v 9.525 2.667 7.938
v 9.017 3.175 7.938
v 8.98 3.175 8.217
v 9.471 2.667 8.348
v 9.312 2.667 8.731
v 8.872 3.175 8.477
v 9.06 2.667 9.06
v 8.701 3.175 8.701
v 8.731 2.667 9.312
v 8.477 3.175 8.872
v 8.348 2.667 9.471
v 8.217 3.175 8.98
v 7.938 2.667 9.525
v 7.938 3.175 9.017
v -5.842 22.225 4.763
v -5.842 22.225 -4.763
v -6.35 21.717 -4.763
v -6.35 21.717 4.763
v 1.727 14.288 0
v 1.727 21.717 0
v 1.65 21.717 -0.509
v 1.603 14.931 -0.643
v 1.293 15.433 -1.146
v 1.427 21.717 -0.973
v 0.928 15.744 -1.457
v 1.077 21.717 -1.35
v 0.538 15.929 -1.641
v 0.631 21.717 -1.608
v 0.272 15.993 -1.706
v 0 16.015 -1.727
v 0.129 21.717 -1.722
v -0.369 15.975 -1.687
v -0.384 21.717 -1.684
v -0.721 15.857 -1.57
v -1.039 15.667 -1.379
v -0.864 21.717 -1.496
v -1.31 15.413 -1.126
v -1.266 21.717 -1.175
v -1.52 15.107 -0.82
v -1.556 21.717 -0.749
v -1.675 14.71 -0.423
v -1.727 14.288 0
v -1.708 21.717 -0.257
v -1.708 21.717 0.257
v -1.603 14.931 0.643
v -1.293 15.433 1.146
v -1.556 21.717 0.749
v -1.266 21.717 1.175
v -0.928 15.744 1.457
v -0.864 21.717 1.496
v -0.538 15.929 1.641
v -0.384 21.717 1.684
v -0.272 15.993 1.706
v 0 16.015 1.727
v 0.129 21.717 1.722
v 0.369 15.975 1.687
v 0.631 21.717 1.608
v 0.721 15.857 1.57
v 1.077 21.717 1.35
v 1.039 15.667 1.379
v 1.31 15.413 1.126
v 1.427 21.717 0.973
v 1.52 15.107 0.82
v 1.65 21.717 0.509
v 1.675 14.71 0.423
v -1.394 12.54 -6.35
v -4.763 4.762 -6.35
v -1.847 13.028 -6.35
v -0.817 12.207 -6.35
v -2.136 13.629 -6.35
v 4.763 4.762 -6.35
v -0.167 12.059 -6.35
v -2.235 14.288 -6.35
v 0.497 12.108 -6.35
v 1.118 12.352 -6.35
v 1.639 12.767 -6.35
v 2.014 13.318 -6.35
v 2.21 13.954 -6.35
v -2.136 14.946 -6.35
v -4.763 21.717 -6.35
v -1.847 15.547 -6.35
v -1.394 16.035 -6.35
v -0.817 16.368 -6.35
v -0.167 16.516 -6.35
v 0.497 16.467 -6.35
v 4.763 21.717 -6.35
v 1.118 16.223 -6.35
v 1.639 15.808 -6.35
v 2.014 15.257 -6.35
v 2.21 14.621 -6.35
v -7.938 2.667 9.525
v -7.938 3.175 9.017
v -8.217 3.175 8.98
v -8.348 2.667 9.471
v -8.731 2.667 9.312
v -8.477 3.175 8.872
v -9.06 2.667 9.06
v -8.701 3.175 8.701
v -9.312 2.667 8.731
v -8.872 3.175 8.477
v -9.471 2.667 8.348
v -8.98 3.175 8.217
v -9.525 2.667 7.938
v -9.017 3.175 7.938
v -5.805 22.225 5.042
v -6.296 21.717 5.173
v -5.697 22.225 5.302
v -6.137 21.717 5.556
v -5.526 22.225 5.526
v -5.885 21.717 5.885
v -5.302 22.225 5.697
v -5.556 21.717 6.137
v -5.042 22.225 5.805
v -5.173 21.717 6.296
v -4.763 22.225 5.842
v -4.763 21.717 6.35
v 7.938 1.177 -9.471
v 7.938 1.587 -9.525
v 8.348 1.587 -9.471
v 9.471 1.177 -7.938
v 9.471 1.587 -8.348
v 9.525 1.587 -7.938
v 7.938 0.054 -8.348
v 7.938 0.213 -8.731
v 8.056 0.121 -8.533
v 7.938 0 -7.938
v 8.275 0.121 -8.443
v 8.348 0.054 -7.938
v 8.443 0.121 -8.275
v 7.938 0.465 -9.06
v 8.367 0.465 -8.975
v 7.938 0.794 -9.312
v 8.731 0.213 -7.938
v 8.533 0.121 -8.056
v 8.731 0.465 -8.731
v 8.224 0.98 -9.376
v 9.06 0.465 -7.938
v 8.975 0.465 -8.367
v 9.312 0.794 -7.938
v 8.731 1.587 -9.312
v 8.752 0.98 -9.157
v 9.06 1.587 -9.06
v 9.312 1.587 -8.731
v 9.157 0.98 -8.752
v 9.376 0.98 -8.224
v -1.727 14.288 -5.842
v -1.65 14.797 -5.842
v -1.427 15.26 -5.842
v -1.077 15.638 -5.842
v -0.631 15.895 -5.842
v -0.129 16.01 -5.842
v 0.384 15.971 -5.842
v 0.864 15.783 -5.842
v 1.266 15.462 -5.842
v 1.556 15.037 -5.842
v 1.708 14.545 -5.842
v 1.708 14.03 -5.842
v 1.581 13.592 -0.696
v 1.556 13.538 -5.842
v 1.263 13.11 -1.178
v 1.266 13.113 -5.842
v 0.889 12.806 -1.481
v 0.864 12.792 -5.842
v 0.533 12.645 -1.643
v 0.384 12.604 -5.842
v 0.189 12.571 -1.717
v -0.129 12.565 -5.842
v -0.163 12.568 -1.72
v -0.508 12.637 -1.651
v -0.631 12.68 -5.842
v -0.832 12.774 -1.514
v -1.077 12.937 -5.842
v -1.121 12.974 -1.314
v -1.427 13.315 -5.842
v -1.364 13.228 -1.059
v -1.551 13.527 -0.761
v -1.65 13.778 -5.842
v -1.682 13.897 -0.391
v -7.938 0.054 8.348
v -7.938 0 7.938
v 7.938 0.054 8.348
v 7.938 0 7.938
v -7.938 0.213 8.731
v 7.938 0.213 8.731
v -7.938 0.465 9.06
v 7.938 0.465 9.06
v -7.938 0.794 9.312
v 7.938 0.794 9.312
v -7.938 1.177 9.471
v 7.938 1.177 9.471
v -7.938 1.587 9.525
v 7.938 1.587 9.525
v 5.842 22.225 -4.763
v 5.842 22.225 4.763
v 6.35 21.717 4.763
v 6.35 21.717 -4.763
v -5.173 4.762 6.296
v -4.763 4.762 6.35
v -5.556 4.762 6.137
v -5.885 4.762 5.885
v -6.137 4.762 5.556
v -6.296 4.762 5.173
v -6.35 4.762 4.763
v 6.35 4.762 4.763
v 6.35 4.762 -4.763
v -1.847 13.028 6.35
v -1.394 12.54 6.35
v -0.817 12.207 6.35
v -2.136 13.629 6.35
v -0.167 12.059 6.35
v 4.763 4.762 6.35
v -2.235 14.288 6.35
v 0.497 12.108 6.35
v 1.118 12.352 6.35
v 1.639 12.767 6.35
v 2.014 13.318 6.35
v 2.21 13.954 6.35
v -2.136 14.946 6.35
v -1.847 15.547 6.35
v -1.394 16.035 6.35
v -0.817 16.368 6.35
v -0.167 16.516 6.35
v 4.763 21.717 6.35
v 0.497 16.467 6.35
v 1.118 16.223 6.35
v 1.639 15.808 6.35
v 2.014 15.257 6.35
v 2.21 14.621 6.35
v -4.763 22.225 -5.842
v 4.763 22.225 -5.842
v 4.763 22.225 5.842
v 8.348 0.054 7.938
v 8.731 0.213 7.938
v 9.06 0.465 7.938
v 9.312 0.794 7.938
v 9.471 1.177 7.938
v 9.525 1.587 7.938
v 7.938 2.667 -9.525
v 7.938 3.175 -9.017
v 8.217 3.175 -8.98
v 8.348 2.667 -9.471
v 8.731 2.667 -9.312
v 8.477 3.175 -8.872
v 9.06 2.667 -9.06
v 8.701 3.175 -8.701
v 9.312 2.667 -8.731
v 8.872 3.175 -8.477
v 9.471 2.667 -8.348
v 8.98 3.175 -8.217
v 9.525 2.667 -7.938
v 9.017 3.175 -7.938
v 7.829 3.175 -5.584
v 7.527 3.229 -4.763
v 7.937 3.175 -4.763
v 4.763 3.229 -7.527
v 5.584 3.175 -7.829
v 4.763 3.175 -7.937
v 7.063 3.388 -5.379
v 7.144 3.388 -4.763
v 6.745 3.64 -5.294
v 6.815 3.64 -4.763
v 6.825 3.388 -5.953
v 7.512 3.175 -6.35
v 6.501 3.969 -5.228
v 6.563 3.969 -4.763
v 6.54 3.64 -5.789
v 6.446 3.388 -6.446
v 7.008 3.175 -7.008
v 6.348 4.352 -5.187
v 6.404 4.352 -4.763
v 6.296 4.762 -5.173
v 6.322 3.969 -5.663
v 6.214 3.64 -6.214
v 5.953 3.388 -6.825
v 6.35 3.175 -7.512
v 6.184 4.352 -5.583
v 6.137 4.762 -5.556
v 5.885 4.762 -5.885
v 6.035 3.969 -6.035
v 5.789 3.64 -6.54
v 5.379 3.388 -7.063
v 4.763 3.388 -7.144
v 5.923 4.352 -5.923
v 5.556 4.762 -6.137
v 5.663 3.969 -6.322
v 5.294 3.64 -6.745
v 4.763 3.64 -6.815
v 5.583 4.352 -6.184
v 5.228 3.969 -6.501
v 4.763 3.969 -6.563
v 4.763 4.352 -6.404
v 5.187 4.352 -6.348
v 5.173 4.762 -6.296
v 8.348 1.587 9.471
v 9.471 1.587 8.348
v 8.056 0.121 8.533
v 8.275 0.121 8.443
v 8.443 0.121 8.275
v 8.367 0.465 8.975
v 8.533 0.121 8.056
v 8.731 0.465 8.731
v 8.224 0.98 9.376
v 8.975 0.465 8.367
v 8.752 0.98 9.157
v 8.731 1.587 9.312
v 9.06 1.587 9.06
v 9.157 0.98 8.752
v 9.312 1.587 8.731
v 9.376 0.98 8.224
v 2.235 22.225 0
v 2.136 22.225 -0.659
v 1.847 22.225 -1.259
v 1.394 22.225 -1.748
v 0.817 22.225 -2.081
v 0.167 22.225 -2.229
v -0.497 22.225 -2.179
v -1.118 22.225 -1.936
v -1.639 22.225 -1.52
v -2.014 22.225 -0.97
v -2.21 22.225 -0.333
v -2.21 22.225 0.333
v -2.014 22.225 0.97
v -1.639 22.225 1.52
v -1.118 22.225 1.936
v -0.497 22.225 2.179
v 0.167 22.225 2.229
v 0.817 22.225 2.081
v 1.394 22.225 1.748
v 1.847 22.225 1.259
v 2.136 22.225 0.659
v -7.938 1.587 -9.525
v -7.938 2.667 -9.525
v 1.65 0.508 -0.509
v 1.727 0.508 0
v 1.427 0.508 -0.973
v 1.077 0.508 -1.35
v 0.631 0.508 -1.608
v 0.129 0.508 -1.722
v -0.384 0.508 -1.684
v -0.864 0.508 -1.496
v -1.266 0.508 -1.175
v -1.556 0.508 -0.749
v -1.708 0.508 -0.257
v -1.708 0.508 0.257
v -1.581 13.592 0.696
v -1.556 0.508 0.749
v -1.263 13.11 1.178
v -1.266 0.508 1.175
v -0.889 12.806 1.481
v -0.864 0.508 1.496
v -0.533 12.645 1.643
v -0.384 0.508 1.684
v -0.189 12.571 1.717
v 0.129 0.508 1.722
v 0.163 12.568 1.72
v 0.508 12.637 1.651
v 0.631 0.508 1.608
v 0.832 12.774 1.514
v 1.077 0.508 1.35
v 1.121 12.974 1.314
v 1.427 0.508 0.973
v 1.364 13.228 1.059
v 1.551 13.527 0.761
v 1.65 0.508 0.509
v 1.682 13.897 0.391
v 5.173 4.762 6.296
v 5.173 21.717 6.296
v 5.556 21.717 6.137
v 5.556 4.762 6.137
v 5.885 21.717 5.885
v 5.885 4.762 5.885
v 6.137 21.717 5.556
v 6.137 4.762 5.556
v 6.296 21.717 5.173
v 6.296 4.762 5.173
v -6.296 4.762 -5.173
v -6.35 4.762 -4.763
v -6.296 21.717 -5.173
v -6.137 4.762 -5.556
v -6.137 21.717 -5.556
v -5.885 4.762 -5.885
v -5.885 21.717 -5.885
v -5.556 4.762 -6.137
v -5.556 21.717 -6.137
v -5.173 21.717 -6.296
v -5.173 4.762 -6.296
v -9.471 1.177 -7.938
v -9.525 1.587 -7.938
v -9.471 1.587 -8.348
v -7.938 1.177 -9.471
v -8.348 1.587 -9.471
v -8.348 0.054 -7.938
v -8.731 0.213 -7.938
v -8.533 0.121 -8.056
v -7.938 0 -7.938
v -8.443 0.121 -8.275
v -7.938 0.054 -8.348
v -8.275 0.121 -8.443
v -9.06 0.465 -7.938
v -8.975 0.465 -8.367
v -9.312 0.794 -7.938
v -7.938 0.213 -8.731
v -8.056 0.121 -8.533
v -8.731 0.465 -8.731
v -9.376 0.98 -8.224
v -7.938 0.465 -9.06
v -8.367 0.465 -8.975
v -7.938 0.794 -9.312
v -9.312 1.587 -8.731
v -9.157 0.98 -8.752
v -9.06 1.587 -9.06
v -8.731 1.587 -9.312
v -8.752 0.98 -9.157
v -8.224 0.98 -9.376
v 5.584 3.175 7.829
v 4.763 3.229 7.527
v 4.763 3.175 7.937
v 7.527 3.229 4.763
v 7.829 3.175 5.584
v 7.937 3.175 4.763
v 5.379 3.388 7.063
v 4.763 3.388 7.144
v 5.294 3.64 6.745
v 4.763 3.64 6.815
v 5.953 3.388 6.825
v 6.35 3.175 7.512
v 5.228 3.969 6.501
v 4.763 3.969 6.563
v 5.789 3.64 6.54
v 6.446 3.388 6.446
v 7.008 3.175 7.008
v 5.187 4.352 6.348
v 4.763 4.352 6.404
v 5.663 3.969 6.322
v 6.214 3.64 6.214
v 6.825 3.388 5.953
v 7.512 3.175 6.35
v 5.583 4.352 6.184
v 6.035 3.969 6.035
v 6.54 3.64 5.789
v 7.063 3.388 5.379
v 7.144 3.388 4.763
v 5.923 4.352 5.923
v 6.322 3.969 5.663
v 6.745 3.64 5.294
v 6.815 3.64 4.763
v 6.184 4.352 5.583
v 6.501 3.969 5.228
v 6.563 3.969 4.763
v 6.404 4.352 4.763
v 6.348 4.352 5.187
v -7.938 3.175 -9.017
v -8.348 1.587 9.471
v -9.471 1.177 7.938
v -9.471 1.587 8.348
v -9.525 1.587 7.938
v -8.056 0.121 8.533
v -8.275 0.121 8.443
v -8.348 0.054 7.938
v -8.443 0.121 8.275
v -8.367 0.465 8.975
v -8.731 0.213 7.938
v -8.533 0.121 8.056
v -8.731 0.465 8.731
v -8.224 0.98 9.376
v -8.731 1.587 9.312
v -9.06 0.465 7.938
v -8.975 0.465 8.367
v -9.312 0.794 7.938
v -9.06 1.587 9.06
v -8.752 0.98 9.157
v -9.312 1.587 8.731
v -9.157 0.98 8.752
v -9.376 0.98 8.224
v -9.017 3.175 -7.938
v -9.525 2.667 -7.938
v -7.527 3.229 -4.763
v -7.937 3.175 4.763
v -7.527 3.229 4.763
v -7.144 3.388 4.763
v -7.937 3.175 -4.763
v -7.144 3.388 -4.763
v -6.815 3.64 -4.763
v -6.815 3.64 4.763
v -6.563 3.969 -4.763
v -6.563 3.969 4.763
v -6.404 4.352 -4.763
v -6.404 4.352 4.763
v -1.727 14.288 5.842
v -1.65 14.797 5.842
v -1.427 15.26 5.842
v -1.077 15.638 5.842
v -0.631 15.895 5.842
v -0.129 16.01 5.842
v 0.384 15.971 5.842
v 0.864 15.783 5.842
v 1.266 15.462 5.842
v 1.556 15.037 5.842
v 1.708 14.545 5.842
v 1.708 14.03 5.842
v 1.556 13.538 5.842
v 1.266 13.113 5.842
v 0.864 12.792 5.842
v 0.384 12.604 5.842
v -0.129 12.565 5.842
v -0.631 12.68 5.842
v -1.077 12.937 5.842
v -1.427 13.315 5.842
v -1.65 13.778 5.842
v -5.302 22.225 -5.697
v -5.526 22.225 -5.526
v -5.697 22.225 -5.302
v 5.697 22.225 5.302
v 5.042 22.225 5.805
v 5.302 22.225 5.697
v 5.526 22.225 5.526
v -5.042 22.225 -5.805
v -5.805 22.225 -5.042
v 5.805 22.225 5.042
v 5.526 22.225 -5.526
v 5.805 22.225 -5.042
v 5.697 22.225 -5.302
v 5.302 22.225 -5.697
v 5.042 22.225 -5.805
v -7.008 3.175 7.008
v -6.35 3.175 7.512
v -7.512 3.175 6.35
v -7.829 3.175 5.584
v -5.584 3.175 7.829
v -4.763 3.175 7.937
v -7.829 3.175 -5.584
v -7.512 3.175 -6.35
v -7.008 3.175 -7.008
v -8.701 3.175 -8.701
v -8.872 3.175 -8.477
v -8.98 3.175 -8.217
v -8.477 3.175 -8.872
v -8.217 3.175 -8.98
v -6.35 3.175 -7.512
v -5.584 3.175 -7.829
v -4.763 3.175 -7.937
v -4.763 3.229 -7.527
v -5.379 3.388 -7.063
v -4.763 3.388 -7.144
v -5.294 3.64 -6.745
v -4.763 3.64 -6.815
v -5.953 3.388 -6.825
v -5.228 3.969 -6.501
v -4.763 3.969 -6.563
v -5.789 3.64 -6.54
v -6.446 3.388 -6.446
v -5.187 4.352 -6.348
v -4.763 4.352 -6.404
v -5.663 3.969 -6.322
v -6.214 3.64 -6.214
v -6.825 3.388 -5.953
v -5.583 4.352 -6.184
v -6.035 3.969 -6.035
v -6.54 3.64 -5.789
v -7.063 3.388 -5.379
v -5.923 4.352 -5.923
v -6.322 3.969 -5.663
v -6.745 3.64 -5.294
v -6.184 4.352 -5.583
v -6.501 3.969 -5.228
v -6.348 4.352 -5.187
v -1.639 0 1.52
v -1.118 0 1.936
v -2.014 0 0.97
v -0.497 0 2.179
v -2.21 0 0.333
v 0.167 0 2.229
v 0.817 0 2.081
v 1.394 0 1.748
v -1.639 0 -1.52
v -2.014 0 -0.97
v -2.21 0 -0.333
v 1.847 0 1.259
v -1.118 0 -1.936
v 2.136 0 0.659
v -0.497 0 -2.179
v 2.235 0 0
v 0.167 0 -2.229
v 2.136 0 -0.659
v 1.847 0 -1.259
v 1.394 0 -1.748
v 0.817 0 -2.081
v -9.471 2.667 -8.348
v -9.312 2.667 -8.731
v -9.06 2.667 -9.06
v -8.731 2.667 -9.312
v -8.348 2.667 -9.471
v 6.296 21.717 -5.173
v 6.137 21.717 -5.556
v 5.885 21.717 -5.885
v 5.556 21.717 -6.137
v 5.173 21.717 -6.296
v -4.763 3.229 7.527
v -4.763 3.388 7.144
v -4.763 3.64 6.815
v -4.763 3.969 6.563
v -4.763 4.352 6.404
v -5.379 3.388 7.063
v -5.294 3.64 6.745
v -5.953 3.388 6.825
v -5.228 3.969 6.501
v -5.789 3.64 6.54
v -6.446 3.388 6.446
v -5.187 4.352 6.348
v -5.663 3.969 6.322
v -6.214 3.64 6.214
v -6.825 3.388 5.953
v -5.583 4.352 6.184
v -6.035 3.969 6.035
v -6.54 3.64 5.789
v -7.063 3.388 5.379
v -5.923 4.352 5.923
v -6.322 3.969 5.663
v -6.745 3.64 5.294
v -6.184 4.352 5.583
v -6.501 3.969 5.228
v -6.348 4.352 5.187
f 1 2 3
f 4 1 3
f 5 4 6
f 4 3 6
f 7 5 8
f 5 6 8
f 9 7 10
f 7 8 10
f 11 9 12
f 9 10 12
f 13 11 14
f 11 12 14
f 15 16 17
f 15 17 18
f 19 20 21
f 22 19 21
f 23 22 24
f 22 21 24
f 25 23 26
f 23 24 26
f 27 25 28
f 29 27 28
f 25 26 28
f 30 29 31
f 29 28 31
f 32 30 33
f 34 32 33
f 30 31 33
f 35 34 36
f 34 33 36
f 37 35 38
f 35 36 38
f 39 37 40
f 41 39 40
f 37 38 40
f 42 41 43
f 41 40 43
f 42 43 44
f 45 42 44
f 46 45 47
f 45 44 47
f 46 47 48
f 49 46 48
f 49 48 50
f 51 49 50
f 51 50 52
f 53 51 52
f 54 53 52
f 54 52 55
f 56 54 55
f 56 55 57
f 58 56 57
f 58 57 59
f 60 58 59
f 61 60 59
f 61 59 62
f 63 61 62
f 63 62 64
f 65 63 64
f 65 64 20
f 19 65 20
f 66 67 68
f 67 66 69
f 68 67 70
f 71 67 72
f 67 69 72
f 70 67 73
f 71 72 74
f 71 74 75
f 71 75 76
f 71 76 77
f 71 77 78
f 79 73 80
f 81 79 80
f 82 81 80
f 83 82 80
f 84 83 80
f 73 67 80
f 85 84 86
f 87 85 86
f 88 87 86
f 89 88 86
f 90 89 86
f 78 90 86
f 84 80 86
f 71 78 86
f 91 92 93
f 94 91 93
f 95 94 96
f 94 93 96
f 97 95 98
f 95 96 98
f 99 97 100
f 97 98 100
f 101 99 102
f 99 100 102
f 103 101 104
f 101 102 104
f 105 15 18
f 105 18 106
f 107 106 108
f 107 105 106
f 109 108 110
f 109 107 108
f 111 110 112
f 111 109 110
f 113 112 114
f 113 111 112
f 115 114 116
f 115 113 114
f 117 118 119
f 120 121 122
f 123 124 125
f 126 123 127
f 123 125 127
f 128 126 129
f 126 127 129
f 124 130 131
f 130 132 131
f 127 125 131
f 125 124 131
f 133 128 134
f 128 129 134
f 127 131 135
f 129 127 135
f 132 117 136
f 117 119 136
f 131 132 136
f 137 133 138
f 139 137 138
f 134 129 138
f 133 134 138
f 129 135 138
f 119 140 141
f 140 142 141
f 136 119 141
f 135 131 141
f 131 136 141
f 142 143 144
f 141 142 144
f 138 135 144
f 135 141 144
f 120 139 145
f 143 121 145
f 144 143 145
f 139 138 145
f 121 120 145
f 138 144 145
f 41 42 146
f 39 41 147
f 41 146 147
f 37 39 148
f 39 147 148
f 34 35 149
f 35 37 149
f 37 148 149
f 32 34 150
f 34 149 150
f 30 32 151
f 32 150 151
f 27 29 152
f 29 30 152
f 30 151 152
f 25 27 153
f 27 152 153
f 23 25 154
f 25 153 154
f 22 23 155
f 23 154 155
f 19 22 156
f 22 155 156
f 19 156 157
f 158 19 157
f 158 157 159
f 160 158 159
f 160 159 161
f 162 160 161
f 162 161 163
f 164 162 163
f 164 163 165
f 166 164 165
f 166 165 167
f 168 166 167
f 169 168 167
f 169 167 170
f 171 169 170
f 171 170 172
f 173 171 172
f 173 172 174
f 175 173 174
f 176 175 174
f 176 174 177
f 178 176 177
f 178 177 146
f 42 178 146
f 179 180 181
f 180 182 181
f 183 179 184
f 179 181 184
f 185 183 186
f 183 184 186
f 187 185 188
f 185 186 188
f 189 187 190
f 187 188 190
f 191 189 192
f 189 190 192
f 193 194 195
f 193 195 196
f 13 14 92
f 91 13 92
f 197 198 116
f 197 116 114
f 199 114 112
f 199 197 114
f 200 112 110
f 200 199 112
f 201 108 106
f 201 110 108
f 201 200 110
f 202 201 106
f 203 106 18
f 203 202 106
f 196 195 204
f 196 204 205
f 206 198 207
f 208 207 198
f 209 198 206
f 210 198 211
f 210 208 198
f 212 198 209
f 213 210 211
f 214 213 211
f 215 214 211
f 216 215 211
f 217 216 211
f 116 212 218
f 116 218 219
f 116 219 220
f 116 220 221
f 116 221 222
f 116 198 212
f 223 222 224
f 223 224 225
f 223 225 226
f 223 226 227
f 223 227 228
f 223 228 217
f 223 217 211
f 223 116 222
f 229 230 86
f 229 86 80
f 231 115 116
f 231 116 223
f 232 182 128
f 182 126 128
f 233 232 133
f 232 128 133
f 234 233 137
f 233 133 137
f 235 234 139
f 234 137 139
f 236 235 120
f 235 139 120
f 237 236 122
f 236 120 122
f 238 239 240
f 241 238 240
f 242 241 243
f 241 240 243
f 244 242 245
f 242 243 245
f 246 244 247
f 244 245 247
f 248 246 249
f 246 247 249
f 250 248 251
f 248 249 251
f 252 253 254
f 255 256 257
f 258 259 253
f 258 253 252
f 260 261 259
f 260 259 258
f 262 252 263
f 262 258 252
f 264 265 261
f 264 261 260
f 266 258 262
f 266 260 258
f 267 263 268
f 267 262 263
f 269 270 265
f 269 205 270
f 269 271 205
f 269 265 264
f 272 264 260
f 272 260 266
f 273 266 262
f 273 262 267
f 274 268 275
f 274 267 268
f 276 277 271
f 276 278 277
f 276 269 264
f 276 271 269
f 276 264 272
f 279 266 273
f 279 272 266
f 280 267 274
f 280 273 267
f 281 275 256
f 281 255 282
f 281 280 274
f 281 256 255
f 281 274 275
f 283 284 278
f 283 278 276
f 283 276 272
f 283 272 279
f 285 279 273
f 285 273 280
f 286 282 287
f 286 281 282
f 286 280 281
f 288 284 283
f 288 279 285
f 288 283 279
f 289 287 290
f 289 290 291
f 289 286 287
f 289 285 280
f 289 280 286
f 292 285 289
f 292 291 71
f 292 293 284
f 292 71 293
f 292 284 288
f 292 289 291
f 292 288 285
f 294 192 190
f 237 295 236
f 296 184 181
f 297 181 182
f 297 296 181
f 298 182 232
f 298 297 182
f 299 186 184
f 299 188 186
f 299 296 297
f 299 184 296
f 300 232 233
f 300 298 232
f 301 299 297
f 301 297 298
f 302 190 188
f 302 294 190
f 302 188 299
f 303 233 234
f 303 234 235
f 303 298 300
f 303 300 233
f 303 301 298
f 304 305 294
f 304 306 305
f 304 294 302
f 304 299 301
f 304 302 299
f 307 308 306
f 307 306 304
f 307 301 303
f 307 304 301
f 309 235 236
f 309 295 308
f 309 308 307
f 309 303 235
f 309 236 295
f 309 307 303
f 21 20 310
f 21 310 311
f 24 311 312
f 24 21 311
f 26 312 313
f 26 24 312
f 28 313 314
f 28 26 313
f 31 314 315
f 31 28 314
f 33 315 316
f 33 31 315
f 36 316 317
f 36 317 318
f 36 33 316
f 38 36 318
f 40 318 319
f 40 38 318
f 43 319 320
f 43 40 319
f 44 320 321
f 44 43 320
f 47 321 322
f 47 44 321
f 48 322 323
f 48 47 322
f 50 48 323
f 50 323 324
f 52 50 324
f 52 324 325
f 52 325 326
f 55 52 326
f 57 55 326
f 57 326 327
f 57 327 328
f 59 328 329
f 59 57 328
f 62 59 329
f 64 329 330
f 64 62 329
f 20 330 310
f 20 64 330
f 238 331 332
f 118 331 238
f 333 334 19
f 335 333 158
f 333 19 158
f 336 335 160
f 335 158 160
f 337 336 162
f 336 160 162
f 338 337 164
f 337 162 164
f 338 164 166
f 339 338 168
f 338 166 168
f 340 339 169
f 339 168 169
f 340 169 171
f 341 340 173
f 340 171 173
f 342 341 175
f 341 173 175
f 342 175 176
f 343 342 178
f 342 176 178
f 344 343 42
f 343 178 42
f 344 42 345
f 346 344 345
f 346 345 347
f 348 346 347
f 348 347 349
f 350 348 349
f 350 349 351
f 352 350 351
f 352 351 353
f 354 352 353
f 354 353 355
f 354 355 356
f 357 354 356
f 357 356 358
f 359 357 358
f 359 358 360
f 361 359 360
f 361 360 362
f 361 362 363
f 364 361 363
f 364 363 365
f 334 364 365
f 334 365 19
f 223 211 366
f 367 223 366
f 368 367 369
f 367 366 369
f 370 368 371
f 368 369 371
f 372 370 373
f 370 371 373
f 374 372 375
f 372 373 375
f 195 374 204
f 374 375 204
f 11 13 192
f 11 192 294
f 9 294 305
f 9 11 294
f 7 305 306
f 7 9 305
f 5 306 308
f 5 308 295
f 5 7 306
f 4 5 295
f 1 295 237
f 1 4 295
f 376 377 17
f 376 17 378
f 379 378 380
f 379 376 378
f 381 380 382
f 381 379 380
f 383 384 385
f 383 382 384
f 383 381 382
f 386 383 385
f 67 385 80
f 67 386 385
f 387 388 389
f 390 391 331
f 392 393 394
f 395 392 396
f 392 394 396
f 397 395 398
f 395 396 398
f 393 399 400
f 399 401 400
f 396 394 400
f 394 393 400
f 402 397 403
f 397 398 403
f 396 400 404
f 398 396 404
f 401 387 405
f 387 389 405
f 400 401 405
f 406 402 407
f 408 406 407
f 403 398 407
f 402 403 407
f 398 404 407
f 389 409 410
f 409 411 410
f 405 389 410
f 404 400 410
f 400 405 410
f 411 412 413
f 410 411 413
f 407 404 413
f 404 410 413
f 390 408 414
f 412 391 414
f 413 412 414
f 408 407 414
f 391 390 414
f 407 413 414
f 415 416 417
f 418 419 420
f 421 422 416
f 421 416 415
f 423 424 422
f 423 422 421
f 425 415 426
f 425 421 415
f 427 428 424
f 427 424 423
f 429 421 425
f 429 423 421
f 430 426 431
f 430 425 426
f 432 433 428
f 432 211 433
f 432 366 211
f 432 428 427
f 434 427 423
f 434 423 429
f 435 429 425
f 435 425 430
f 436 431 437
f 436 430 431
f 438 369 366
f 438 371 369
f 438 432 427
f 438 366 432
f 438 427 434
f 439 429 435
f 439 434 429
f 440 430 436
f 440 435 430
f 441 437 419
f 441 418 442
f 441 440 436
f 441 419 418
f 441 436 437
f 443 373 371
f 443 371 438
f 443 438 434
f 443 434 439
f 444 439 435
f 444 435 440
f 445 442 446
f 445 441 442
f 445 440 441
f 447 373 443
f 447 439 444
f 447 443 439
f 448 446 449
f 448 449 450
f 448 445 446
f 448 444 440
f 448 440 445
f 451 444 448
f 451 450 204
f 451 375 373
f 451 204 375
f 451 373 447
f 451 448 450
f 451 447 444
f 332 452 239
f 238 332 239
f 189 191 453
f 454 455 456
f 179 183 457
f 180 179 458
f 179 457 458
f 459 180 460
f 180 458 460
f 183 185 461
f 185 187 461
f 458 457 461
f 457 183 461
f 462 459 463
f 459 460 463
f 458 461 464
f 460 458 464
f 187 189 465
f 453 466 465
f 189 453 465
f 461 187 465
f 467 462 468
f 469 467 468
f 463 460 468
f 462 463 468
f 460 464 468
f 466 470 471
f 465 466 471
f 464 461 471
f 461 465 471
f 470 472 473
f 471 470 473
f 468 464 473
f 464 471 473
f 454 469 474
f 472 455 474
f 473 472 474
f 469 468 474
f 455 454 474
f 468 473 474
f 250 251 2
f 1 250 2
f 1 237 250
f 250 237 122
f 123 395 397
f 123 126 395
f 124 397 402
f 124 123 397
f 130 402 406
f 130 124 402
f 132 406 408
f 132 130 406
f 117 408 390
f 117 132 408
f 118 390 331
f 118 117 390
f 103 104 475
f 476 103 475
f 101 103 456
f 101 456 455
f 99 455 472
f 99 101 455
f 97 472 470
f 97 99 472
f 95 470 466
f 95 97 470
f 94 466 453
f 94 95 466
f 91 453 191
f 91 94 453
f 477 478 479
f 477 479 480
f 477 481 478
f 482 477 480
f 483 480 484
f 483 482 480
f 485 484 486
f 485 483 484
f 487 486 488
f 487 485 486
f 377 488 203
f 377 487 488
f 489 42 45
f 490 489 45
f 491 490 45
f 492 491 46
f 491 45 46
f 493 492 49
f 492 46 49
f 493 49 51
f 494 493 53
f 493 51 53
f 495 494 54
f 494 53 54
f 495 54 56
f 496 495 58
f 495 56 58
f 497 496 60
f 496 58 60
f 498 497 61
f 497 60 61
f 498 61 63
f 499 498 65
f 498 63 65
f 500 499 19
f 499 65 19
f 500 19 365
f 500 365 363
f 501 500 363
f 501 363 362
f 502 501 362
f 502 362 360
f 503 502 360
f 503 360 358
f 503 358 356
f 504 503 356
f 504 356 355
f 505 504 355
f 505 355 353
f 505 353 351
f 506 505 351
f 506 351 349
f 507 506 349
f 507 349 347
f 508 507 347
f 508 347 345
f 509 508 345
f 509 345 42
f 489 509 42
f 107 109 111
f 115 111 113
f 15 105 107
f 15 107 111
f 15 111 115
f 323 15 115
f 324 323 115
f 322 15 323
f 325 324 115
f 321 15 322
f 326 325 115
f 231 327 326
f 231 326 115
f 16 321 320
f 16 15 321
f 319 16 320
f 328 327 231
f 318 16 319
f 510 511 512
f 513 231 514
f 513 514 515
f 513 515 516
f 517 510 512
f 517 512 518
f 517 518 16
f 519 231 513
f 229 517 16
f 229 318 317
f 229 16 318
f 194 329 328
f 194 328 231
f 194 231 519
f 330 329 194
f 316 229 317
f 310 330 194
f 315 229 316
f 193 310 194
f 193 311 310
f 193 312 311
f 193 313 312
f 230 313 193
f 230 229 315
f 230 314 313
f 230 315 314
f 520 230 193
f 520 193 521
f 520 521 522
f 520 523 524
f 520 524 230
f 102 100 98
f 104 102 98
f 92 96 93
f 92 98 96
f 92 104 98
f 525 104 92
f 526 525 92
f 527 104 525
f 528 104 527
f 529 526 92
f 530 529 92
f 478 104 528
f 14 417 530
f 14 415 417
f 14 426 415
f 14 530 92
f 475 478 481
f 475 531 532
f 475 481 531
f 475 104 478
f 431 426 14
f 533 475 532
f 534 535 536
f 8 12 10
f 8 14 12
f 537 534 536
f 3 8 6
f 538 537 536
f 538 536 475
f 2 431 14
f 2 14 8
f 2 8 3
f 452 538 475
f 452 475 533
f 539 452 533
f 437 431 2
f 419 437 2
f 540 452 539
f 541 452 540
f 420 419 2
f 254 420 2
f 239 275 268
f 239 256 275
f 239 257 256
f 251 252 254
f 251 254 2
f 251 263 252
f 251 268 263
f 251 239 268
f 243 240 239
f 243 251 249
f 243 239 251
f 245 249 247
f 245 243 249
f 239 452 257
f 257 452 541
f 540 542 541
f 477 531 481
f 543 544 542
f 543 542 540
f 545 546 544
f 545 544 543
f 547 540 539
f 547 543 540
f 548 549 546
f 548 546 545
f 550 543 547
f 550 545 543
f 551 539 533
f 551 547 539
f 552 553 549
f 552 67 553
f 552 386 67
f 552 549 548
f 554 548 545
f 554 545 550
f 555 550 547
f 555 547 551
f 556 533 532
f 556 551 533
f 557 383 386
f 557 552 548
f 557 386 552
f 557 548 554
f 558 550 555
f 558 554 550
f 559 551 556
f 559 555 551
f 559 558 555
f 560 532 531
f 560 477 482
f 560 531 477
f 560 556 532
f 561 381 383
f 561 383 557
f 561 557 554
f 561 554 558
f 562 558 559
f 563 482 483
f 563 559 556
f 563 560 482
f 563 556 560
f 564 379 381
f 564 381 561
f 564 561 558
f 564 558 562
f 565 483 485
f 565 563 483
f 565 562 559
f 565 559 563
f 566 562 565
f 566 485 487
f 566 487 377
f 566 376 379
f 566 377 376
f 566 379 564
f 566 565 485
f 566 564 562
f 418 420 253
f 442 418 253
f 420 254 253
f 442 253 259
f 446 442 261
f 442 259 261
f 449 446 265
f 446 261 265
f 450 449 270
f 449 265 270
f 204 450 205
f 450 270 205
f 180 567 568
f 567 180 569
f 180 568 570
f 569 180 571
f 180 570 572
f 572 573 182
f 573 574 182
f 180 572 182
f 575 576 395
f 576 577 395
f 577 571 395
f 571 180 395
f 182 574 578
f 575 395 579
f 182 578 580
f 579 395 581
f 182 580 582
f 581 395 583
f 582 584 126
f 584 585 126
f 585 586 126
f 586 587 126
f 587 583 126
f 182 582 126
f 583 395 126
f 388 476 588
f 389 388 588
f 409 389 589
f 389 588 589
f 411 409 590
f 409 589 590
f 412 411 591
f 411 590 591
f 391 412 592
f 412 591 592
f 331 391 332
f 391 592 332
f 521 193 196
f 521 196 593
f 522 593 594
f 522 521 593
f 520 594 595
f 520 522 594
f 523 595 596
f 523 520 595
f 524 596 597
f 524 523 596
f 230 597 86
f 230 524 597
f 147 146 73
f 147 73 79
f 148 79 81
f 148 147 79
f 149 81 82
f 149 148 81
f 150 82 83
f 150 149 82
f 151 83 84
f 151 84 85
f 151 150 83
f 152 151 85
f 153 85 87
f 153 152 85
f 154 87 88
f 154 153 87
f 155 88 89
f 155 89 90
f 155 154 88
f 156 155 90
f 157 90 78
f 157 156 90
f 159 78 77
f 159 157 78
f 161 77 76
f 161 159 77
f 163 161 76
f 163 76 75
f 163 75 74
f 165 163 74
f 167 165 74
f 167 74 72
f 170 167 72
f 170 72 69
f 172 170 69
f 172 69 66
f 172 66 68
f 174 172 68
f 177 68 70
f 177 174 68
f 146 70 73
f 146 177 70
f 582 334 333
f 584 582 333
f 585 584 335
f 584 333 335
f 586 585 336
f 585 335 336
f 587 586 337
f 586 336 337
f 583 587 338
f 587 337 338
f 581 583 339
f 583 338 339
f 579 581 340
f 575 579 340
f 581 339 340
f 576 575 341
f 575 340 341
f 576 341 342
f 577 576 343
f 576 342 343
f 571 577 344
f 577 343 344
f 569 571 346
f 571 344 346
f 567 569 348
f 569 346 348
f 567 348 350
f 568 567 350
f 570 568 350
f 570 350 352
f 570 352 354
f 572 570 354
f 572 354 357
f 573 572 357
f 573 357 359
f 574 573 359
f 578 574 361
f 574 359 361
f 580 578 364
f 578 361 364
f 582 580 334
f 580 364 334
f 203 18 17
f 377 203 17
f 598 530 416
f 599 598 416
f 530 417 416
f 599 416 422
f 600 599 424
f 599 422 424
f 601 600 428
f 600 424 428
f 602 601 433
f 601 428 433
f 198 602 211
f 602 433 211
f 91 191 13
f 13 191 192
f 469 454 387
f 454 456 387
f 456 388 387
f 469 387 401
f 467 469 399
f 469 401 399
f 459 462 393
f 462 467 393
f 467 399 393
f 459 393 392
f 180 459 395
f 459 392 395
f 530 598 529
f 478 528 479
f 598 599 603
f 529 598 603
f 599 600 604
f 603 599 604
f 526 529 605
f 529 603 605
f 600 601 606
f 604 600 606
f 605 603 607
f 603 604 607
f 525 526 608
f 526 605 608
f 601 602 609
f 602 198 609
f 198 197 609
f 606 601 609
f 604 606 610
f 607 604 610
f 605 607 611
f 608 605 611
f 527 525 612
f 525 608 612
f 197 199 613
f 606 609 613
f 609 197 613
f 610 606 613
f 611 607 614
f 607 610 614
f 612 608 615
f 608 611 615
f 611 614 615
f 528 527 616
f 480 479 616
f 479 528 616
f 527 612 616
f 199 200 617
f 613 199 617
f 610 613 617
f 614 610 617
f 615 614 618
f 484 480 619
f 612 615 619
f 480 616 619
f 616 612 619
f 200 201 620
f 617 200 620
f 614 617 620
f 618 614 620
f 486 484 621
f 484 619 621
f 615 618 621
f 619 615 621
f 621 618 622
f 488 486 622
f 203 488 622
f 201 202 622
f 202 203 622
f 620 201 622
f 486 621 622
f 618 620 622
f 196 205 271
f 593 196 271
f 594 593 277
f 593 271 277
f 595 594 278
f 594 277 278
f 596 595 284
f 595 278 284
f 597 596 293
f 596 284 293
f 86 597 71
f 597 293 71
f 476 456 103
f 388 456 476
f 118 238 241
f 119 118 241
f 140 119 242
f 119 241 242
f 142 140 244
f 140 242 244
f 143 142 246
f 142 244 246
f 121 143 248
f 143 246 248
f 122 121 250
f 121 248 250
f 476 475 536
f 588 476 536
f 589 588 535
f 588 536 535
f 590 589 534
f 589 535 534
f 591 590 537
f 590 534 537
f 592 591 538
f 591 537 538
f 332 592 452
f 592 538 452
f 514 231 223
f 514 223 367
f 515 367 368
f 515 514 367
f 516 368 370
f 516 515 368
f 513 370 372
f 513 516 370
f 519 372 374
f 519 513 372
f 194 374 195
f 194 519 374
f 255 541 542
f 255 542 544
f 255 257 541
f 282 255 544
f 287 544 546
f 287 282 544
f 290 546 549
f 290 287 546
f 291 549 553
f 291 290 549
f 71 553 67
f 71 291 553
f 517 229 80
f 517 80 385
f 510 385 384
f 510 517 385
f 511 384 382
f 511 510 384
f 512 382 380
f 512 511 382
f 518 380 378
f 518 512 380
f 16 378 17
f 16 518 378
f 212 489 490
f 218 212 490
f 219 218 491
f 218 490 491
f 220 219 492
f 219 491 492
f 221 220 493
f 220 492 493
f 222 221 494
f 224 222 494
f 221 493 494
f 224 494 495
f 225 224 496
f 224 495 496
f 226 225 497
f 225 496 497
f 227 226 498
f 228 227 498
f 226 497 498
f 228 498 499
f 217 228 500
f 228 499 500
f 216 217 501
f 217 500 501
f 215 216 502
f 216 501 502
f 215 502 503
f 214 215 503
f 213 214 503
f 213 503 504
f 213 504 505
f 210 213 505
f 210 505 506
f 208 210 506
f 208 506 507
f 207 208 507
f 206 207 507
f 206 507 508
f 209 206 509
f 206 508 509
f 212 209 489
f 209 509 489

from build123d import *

# Parameters (mm, degrees)
SKETCH1_W             = 19.05
SKETCH1_H             = 19.05
BOSS_EXTRUDE1_DEPTH   = 22.225
SKETCH2_OUTSIDE_W     = 28.034
SKETCH2_OUTSIDE_H     = 28.034
SKETCH2_OUTSIDE_W_2   = 12.7
SKETCH2_OUTSIDE_H_2   = 12.7
CUT_EXTRUDE1_DEPTH    = 19.05
F_8_32_TAPPED_HOLE2_D = 3.4544
F_8_32_TAPPED_HOLE1_D = 3.4544
FILLET1_R             = 1.5875
CHAMFER1_SIZE         = 0.508


with BuildPart() as part:
    # Sketch1 → Boss-Extrude1 (new body)
    with BuildSketch(Plane(origin=(0, 0, 0), x_dir=(1, 0, 0), z_dir=(0, 1, 0))):
        Rectangle(SKETCH1_W, SKETCH1_H)
    extrude(amount=BOSS_EXTRUDE1_DEPTH)

    # Sketch2 outside → Cut-Extrude1 (cut)
    with BuildSketch(Plane(origin=(0, 22.225, 0), x_dir=(1, 0, 0), z_dir=(0, 1, 0))):
        Rectangle(SKETCH2_OUTSIDE_W, SKETCH2_OUTSIDE_H)
        Rectangle(SKETCH2_OUTSIDE_W_2, SKETCH2_OUTSIDE_H_2, mode=Mode.SUBTRACT)
    extrude(amount=-CUT_EXTRUDE1_DEPTH, mode=Mode.SUBTRACT)

    # #8-32 Tapped Hole2 (through all)
    with Locations(Plane(origin=(0, 0, 0), x_dir=(-1, 0, 0), z_dir=(0, -1, 0))):
        with Locations((0, 0)):
            Hole(F_8_32_TAPPED_HOLE2_D / 2)

    # #8-32 Tapped Hole1 (through all)
    with Locations(Plane.XY.offset(6.35)):
        with Locations((0, 14.2875)):
            Hole(F_8_32_TAPPED_HOLE1_D / 2)

    # Fillet1
    fillet1_edges = [part.edges().sort_by_distance(p)[0] for p in [
        (9.525, 1.5875, 9.525),
        (-9.525, 1.5875, 9.525),
        (-9.525, 1.5875, -9.525),
        (9.525, 1.5875, -9.525),
        (0, 3.175, 6.35),
        (6.35, 3.175, 0),
        (0, 3.175, -6.35),
        (-6.35, 3.175, 0),
        (6.35, 12.7, 6.35),
        (-6.35, 12.7, 6.35),
        (-6.35, 12.7, -6.35),
        (6.35, 12.7, -6.35),
        (0, 0, 9.525),
        (-9.525, 0, 0),
        (0, 0, -9.525),
        (9.525, 0, 0),
    ]]
    fillet(fillet1_edges, radius=FILLET1_R - 0.0001)  # a hair under: the kernel refuses the full size

    # Chamfer1
    chamfer1_edges = [part.edges().sort_by_distance(p)[0] for p in [
        (-1.7272, 0, 0),
        (-1.7272, 22.225, 0),
        (1.7272, 14.2875, -6.35),
        (1.7272, 14.2875, 6.35),
        (0, 22.225, 6.35),
        (6.35, 22.225, 0),
        (0, 22.225, -6.35),
        (-6.35, 22.225, 0),
        (-5.885061304, 22.225, -5.885061304),
        (5.885061304, 22.225, -5.885061304),
        (-5.885061304, 22.225, 5.885061304),
        (5.885061304, 22.225, 5.885061304),
        (-9.525, 3.175, 0),
        (0, 3.175, 9.525),
        (9.525, 3.175, 0),
        (0, 3.175, -9.525),
        (9.060061304, 3.175, -9.060061304),
        (-9.060061304, 3.175, -9.060061304),
        (-9.060061304, 3.175, 9.060061304),
        (9.060061304, 3.175, 9.060061304),
    ]]
    chamfer(chamfer1_edges, length=CHAMFER1_SIZE)


solid = part.part
